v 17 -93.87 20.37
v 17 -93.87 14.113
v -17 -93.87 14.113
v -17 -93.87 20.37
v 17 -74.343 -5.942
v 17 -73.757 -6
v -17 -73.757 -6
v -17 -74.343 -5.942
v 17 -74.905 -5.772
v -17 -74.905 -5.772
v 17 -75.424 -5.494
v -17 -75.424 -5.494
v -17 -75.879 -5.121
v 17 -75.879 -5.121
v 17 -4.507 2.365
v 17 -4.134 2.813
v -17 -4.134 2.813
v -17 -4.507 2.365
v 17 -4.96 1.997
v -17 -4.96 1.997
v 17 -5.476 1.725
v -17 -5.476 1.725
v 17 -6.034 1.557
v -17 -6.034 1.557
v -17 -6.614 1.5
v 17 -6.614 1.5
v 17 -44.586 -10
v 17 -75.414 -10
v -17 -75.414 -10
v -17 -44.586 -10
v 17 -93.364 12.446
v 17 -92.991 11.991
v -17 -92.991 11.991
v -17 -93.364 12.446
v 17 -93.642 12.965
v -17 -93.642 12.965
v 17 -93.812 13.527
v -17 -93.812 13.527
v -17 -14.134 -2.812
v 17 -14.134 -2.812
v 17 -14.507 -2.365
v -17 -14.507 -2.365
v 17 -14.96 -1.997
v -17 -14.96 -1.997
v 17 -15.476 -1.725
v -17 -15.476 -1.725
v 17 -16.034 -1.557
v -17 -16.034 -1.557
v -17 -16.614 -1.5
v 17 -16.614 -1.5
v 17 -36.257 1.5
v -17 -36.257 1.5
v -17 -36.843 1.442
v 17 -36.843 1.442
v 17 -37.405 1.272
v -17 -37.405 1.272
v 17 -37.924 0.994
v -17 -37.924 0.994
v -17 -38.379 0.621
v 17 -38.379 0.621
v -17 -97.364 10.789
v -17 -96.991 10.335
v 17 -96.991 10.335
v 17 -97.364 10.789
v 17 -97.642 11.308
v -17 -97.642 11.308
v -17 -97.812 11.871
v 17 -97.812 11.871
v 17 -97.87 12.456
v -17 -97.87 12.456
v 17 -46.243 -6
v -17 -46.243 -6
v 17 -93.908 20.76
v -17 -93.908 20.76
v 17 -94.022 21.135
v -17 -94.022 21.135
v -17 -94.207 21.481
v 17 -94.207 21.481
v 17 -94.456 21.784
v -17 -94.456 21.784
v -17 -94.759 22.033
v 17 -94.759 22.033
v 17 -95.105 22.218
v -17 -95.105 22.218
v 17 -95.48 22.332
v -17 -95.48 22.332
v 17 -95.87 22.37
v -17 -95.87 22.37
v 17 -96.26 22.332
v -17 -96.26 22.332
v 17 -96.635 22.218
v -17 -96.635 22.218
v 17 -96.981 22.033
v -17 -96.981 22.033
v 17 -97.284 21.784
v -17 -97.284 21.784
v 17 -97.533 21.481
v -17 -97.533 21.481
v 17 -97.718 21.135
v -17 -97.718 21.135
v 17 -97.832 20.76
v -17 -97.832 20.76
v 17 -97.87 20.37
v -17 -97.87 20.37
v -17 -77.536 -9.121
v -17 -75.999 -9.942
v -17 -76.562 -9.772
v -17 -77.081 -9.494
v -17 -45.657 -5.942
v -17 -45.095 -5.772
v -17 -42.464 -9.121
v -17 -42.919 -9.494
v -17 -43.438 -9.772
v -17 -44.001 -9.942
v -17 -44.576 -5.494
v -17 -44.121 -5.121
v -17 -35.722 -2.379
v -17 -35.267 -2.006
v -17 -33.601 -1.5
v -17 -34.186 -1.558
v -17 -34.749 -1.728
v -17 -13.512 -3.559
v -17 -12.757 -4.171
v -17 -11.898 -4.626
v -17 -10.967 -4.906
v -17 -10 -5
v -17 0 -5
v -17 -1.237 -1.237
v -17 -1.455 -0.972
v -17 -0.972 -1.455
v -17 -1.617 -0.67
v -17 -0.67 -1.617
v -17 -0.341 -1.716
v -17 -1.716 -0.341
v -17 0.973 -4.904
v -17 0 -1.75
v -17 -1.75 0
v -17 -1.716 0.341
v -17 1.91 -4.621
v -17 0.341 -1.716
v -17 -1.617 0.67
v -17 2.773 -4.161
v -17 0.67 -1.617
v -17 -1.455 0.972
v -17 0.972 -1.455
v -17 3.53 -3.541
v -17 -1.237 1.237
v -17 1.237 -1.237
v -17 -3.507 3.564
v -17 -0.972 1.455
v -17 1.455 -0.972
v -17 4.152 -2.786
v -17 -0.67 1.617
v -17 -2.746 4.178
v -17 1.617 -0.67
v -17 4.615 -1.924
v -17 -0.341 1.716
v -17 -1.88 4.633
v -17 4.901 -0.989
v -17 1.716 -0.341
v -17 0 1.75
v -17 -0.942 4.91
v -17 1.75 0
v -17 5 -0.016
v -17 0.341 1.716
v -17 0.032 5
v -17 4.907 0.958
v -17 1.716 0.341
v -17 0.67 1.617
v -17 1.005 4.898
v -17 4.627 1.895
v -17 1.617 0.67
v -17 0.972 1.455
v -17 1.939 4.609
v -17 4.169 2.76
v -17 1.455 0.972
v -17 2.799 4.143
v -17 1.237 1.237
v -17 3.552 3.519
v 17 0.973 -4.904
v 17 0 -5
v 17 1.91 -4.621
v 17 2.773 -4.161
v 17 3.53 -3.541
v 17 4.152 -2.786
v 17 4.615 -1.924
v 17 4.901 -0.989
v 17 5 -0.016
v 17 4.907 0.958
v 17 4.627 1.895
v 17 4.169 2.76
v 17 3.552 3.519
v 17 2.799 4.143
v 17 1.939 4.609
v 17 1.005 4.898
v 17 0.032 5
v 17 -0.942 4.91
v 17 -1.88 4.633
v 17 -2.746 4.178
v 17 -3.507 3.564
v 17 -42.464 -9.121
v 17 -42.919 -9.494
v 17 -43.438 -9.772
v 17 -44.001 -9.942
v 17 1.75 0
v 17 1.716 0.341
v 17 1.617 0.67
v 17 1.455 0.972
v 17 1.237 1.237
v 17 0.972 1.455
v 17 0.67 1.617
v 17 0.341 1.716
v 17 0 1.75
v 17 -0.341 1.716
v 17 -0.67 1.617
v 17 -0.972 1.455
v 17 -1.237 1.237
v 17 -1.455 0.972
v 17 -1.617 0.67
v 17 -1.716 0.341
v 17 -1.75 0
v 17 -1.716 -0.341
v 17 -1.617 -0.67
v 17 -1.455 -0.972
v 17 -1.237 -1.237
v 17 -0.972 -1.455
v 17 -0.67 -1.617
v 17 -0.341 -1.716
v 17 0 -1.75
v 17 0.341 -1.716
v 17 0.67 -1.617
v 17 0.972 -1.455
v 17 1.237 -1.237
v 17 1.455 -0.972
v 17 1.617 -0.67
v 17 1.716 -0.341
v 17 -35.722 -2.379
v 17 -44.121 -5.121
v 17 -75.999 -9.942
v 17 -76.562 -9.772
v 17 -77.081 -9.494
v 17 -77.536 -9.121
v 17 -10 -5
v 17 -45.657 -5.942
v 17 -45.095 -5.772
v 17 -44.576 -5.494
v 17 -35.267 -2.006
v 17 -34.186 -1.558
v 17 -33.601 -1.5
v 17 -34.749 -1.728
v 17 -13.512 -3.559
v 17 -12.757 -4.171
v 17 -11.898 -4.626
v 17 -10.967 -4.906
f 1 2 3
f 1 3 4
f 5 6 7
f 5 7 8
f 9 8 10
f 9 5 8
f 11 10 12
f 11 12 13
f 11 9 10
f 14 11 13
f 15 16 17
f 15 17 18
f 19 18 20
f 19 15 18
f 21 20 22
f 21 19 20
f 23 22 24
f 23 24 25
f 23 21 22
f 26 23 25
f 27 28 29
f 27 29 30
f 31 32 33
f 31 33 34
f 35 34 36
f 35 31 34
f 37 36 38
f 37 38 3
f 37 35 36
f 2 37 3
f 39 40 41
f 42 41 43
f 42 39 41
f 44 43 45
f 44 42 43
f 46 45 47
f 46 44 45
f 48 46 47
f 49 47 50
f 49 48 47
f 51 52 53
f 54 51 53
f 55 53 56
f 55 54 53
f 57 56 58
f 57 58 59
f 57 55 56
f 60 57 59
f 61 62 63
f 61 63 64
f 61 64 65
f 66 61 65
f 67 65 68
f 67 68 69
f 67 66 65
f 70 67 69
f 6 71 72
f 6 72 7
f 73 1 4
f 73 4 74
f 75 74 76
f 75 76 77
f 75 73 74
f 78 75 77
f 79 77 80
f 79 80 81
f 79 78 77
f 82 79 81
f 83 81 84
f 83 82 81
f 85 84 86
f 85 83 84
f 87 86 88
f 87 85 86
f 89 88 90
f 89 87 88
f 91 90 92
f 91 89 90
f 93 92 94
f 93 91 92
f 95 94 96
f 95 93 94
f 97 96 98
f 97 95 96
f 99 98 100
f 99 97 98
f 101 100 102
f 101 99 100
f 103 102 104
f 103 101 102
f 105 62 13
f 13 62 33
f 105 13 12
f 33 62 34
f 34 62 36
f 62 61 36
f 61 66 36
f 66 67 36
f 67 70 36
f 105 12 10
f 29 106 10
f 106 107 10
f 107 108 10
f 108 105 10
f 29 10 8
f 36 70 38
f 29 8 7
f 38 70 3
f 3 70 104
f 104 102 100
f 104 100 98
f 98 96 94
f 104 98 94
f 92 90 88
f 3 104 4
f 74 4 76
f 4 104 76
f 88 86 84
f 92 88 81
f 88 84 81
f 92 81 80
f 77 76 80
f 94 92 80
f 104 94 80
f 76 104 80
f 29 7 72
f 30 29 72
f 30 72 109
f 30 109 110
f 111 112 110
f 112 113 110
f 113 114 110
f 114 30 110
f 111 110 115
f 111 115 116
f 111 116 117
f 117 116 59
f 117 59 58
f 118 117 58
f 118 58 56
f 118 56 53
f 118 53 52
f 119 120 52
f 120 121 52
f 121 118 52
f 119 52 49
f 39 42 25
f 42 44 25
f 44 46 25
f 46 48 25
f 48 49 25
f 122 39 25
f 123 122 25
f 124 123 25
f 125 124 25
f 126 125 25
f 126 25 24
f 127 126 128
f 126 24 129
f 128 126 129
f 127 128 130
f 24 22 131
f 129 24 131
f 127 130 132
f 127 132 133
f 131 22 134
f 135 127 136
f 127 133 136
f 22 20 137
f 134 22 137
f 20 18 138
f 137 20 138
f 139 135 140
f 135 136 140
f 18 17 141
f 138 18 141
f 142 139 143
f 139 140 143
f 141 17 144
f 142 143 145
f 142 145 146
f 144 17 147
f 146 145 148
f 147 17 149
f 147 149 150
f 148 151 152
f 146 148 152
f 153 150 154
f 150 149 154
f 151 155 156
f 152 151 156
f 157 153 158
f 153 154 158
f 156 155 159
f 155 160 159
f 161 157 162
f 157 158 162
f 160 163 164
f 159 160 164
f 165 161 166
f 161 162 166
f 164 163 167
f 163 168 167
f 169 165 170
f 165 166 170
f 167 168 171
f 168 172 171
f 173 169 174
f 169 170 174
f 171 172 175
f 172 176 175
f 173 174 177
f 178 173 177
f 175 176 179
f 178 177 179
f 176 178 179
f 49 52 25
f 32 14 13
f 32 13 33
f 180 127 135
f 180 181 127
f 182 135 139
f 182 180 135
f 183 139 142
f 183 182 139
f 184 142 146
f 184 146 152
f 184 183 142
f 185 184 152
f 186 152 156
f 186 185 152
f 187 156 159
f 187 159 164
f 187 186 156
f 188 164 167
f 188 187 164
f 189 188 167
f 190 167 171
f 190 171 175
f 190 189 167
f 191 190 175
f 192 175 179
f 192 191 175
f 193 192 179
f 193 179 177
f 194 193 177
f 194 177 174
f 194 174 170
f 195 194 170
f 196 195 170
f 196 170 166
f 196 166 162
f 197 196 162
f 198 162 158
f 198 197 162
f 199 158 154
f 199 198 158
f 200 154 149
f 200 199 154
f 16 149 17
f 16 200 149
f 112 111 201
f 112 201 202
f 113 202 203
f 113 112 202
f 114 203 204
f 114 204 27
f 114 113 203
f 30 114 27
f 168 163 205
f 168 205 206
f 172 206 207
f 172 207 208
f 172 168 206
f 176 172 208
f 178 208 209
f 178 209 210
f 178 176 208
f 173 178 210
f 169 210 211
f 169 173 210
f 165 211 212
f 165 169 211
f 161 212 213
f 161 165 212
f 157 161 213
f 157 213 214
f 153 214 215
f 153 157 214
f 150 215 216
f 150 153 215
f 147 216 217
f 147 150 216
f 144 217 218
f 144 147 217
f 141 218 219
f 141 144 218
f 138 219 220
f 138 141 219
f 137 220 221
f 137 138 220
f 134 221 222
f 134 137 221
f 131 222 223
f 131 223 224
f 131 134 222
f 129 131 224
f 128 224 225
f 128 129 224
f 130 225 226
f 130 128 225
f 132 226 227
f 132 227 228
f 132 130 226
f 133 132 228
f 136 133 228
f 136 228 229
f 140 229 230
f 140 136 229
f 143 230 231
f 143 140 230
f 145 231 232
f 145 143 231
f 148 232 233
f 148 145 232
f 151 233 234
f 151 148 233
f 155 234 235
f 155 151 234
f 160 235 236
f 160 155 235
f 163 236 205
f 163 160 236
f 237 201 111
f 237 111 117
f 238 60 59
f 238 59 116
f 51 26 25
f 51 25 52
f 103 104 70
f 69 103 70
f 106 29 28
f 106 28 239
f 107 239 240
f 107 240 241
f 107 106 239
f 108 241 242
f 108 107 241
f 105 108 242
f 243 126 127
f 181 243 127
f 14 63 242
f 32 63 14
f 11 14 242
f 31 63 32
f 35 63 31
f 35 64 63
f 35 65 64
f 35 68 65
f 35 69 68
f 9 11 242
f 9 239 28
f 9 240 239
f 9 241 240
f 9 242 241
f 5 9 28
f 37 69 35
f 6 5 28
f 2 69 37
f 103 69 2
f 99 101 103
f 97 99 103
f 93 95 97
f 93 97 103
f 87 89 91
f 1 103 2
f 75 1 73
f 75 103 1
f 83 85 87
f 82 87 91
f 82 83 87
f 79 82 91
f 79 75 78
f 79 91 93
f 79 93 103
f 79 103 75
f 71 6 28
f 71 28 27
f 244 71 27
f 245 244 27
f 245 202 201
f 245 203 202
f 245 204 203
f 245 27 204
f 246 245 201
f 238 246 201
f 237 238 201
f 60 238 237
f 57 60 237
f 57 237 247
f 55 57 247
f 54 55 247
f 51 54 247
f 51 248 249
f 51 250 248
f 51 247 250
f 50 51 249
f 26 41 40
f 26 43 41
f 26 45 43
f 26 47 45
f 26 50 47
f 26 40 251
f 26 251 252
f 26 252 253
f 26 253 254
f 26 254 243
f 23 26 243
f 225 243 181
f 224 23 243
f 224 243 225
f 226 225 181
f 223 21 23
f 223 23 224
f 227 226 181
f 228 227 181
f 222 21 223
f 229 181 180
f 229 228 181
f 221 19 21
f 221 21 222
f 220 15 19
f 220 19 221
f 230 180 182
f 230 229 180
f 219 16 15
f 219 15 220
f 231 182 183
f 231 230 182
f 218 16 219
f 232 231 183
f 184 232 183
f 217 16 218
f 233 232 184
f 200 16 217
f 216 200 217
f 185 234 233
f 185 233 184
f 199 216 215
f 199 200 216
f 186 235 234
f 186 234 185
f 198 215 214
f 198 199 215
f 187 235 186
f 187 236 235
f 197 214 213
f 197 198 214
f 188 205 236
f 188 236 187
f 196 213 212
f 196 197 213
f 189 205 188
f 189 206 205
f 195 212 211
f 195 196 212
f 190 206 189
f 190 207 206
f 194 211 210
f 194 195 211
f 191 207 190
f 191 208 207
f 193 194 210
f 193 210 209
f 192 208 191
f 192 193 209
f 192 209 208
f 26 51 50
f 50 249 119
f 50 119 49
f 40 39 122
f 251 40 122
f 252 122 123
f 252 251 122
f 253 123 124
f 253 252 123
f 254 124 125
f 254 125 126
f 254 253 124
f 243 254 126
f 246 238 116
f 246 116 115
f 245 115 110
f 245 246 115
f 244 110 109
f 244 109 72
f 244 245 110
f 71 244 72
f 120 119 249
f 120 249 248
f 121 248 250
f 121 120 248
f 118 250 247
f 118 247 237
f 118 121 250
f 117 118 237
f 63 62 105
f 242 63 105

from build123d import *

# Parameters (mm, degrees)
F0_R     = 1.75
F1_DEPTH = 17.5
F3_DEPTH = 35
F4_R     = 3
F5_DEPTH = 0.5
F6_DEPTH = 0.5


with BuildPart() as f1:
    # F0 (on Right) → F1 (new body, symmetric)
    with BuildSketch(Plane.YZ):
        with BuildLine():
            Line((-5.2303039929, -1.5), (-4.7696960071, -1.5))
            ThreePointArc((-4.7696960071, -1.5), (5, 0), (-4.7696960071, 1.5))
            Line((-4.7696960071, 1.5), (-37.5, 1.5))
            Line((-37.5, 1.5), (-45, -6))
            Line((-45, -6), (-75, -6))
            Line((-75, -6), (-93.8700576851, 12.8700576851))
            Line((-93.8700576851, 12.8700576851), (-93.8700576851, 20.3700576851))
            ThreePointArc((-93.8700576851, 20.3700576851), (-95.8700576851, 22.3700576851), (-97.8700576851, 20.3700576851))
            Line((-97.8700576851, 20.3700576851), (-97.8700576851, 11.2132034356))
            Line((-97.8700576851, 11.2132034356), (-76.6568542495, -10))
            Line((-76.6568542495, -10), (-43.3431457505, -10))
            Line((-43.3431457505, -10), (-34.8431457505, -1.5))
            Line((-34.8431457505, -1.5), (-14.7696960071, -1.5))
            ThreePointArc((-14.7696960071, -1.5), (-10, -5), (-5.2303039929, -1.5))
        make_face()
        Circle(F0_R, mode=Mode.SUBTRACT)
    extrude(amount=F1_DEPTH, both=True)

    # F2 (on face) → F3 (join, through all)
    with BuildSketch(Plane.YZ.offset(17.5)):
        with BuildLine():
            ThreePointArc((-5.2303039929, -1.5), (-7.0419601085, -4.0311288741), (-10, -5))
            Line((-10, -5), (0, -5))
            ThreePointArc((0, -5), (-2.9580398915, -4.0311288741), (-4.7696960071, -1.5))
            Line((-4.7696960071, -1.5), (-5.2303039929, -1.5))
        make_face()
    extrude(amount=-F3_DEPTH)

    # F4
    f4_edges = [f1.edges().sort_by_distance(p)[0] for p in [
        (0, -4.769696, 1.5),
        (0, -14.769696, -1.5),
        (0, -75, -6),
        (0, -76.656854, -10),
        (0, -43.343146, -10),
        (0, -34.843146, -1.5),
        (0, -45, -6),
        (0, -37.5, 1.5),
        (0, -97.870058, 11.213203),
        (0, -93.870058, 12.870058),
    ]]
    fillet(f4_edges, radius=F4_R)

    # F5 (cut): a face of the model
    f5_faces = [f1.faces().sort_by_distance(p)[0] for p in [
        (17.5, -96.7916296902, 16.4129509039),
    ]]
    extrude(f5_faces, amount=-F5_DEPTH, mode=Mode.SUBTRACT)

    # F6 (cut): a face of the model
    f6_faces = [f1.faces().sort_by_distance(p)[0] for p in [
        (-17.5, -96.7916296902, 16.4129509039),
    ]]
    extrude(f6_faces, amount=-F6_DEPTH, mode=Mode.SUBTRACT)


solid = f1.part
